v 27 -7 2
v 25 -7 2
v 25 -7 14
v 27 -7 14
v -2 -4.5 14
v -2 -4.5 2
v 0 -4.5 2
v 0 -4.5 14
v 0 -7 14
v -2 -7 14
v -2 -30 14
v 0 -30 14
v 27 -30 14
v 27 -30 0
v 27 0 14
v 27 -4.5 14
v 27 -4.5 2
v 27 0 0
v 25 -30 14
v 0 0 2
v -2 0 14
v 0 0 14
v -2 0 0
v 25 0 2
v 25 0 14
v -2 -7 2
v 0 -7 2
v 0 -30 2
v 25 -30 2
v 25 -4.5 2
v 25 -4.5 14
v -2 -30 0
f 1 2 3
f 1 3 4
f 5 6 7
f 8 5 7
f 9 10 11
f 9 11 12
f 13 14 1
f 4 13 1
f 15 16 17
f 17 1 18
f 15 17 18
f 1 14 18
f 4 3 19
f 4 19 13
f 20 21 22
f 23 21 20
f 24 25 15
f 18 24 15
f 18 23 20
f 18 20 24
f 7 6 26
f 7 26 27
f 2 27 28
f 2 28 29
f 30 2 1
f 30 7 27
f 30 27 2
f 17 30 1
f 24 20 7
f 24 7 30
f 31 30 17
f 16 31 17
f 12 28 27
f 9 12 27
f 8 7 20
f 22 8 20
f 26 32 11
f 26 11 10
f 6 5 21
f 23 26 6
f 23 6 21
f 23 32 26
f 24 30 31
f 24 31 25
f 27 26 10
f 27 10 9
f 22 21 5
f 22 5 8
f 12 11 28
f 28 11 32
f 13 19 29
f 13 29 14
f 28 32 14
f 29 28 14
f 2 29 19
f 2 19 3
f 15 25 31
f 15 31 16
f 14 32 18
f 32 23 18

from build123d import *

# Parameters (mm, degrees)
F0_W     = 2
F0_H     = 2.5
F1_DEPTH = 2
F0_H_2   = 23
F0_H_3   = 4.5
F2_DEPTH = 14


with BuildPart() as f1:
    # F0 (on Top) → F1 (new body)
    with BuildSketch(Plane.XY):
        Polygon((12.5, 0), (0, 0), (0, -4.5), (0, -7), (0, -30), (12.5, -30), align=None)
        Polygon((25, 0), (12.5, 0), (12.5, -30), (25, -30), (25, -7), (25, -4.5), align=None)
        with Locations((-1, -5.75)):
            Rectangle(F0_W, F0_H)
        with Locations((26, -5.75)):
            Rectangle(F0_W, F0_H)
    extrude(amount=F1_DEPTH)

    # F0 (on Top) → F2 (join)
    with BuildSketch(Plane.XY):
        with Locations((-1, -18.5)):
            Rectangle(F0_W, F0_H_2)
        with Locations((-1, -2.25)):
            Rectangle(F0_W, F0_H_3)
        with Locations((26, -2.25)):
            Rectangle(F0_W, F0_H_3)
        with Locations((26, -18.5)):
            Rectangle(F0_W, F0_H_2)
    extrude(amount=F2_DEPTH)


solid = f1.part
